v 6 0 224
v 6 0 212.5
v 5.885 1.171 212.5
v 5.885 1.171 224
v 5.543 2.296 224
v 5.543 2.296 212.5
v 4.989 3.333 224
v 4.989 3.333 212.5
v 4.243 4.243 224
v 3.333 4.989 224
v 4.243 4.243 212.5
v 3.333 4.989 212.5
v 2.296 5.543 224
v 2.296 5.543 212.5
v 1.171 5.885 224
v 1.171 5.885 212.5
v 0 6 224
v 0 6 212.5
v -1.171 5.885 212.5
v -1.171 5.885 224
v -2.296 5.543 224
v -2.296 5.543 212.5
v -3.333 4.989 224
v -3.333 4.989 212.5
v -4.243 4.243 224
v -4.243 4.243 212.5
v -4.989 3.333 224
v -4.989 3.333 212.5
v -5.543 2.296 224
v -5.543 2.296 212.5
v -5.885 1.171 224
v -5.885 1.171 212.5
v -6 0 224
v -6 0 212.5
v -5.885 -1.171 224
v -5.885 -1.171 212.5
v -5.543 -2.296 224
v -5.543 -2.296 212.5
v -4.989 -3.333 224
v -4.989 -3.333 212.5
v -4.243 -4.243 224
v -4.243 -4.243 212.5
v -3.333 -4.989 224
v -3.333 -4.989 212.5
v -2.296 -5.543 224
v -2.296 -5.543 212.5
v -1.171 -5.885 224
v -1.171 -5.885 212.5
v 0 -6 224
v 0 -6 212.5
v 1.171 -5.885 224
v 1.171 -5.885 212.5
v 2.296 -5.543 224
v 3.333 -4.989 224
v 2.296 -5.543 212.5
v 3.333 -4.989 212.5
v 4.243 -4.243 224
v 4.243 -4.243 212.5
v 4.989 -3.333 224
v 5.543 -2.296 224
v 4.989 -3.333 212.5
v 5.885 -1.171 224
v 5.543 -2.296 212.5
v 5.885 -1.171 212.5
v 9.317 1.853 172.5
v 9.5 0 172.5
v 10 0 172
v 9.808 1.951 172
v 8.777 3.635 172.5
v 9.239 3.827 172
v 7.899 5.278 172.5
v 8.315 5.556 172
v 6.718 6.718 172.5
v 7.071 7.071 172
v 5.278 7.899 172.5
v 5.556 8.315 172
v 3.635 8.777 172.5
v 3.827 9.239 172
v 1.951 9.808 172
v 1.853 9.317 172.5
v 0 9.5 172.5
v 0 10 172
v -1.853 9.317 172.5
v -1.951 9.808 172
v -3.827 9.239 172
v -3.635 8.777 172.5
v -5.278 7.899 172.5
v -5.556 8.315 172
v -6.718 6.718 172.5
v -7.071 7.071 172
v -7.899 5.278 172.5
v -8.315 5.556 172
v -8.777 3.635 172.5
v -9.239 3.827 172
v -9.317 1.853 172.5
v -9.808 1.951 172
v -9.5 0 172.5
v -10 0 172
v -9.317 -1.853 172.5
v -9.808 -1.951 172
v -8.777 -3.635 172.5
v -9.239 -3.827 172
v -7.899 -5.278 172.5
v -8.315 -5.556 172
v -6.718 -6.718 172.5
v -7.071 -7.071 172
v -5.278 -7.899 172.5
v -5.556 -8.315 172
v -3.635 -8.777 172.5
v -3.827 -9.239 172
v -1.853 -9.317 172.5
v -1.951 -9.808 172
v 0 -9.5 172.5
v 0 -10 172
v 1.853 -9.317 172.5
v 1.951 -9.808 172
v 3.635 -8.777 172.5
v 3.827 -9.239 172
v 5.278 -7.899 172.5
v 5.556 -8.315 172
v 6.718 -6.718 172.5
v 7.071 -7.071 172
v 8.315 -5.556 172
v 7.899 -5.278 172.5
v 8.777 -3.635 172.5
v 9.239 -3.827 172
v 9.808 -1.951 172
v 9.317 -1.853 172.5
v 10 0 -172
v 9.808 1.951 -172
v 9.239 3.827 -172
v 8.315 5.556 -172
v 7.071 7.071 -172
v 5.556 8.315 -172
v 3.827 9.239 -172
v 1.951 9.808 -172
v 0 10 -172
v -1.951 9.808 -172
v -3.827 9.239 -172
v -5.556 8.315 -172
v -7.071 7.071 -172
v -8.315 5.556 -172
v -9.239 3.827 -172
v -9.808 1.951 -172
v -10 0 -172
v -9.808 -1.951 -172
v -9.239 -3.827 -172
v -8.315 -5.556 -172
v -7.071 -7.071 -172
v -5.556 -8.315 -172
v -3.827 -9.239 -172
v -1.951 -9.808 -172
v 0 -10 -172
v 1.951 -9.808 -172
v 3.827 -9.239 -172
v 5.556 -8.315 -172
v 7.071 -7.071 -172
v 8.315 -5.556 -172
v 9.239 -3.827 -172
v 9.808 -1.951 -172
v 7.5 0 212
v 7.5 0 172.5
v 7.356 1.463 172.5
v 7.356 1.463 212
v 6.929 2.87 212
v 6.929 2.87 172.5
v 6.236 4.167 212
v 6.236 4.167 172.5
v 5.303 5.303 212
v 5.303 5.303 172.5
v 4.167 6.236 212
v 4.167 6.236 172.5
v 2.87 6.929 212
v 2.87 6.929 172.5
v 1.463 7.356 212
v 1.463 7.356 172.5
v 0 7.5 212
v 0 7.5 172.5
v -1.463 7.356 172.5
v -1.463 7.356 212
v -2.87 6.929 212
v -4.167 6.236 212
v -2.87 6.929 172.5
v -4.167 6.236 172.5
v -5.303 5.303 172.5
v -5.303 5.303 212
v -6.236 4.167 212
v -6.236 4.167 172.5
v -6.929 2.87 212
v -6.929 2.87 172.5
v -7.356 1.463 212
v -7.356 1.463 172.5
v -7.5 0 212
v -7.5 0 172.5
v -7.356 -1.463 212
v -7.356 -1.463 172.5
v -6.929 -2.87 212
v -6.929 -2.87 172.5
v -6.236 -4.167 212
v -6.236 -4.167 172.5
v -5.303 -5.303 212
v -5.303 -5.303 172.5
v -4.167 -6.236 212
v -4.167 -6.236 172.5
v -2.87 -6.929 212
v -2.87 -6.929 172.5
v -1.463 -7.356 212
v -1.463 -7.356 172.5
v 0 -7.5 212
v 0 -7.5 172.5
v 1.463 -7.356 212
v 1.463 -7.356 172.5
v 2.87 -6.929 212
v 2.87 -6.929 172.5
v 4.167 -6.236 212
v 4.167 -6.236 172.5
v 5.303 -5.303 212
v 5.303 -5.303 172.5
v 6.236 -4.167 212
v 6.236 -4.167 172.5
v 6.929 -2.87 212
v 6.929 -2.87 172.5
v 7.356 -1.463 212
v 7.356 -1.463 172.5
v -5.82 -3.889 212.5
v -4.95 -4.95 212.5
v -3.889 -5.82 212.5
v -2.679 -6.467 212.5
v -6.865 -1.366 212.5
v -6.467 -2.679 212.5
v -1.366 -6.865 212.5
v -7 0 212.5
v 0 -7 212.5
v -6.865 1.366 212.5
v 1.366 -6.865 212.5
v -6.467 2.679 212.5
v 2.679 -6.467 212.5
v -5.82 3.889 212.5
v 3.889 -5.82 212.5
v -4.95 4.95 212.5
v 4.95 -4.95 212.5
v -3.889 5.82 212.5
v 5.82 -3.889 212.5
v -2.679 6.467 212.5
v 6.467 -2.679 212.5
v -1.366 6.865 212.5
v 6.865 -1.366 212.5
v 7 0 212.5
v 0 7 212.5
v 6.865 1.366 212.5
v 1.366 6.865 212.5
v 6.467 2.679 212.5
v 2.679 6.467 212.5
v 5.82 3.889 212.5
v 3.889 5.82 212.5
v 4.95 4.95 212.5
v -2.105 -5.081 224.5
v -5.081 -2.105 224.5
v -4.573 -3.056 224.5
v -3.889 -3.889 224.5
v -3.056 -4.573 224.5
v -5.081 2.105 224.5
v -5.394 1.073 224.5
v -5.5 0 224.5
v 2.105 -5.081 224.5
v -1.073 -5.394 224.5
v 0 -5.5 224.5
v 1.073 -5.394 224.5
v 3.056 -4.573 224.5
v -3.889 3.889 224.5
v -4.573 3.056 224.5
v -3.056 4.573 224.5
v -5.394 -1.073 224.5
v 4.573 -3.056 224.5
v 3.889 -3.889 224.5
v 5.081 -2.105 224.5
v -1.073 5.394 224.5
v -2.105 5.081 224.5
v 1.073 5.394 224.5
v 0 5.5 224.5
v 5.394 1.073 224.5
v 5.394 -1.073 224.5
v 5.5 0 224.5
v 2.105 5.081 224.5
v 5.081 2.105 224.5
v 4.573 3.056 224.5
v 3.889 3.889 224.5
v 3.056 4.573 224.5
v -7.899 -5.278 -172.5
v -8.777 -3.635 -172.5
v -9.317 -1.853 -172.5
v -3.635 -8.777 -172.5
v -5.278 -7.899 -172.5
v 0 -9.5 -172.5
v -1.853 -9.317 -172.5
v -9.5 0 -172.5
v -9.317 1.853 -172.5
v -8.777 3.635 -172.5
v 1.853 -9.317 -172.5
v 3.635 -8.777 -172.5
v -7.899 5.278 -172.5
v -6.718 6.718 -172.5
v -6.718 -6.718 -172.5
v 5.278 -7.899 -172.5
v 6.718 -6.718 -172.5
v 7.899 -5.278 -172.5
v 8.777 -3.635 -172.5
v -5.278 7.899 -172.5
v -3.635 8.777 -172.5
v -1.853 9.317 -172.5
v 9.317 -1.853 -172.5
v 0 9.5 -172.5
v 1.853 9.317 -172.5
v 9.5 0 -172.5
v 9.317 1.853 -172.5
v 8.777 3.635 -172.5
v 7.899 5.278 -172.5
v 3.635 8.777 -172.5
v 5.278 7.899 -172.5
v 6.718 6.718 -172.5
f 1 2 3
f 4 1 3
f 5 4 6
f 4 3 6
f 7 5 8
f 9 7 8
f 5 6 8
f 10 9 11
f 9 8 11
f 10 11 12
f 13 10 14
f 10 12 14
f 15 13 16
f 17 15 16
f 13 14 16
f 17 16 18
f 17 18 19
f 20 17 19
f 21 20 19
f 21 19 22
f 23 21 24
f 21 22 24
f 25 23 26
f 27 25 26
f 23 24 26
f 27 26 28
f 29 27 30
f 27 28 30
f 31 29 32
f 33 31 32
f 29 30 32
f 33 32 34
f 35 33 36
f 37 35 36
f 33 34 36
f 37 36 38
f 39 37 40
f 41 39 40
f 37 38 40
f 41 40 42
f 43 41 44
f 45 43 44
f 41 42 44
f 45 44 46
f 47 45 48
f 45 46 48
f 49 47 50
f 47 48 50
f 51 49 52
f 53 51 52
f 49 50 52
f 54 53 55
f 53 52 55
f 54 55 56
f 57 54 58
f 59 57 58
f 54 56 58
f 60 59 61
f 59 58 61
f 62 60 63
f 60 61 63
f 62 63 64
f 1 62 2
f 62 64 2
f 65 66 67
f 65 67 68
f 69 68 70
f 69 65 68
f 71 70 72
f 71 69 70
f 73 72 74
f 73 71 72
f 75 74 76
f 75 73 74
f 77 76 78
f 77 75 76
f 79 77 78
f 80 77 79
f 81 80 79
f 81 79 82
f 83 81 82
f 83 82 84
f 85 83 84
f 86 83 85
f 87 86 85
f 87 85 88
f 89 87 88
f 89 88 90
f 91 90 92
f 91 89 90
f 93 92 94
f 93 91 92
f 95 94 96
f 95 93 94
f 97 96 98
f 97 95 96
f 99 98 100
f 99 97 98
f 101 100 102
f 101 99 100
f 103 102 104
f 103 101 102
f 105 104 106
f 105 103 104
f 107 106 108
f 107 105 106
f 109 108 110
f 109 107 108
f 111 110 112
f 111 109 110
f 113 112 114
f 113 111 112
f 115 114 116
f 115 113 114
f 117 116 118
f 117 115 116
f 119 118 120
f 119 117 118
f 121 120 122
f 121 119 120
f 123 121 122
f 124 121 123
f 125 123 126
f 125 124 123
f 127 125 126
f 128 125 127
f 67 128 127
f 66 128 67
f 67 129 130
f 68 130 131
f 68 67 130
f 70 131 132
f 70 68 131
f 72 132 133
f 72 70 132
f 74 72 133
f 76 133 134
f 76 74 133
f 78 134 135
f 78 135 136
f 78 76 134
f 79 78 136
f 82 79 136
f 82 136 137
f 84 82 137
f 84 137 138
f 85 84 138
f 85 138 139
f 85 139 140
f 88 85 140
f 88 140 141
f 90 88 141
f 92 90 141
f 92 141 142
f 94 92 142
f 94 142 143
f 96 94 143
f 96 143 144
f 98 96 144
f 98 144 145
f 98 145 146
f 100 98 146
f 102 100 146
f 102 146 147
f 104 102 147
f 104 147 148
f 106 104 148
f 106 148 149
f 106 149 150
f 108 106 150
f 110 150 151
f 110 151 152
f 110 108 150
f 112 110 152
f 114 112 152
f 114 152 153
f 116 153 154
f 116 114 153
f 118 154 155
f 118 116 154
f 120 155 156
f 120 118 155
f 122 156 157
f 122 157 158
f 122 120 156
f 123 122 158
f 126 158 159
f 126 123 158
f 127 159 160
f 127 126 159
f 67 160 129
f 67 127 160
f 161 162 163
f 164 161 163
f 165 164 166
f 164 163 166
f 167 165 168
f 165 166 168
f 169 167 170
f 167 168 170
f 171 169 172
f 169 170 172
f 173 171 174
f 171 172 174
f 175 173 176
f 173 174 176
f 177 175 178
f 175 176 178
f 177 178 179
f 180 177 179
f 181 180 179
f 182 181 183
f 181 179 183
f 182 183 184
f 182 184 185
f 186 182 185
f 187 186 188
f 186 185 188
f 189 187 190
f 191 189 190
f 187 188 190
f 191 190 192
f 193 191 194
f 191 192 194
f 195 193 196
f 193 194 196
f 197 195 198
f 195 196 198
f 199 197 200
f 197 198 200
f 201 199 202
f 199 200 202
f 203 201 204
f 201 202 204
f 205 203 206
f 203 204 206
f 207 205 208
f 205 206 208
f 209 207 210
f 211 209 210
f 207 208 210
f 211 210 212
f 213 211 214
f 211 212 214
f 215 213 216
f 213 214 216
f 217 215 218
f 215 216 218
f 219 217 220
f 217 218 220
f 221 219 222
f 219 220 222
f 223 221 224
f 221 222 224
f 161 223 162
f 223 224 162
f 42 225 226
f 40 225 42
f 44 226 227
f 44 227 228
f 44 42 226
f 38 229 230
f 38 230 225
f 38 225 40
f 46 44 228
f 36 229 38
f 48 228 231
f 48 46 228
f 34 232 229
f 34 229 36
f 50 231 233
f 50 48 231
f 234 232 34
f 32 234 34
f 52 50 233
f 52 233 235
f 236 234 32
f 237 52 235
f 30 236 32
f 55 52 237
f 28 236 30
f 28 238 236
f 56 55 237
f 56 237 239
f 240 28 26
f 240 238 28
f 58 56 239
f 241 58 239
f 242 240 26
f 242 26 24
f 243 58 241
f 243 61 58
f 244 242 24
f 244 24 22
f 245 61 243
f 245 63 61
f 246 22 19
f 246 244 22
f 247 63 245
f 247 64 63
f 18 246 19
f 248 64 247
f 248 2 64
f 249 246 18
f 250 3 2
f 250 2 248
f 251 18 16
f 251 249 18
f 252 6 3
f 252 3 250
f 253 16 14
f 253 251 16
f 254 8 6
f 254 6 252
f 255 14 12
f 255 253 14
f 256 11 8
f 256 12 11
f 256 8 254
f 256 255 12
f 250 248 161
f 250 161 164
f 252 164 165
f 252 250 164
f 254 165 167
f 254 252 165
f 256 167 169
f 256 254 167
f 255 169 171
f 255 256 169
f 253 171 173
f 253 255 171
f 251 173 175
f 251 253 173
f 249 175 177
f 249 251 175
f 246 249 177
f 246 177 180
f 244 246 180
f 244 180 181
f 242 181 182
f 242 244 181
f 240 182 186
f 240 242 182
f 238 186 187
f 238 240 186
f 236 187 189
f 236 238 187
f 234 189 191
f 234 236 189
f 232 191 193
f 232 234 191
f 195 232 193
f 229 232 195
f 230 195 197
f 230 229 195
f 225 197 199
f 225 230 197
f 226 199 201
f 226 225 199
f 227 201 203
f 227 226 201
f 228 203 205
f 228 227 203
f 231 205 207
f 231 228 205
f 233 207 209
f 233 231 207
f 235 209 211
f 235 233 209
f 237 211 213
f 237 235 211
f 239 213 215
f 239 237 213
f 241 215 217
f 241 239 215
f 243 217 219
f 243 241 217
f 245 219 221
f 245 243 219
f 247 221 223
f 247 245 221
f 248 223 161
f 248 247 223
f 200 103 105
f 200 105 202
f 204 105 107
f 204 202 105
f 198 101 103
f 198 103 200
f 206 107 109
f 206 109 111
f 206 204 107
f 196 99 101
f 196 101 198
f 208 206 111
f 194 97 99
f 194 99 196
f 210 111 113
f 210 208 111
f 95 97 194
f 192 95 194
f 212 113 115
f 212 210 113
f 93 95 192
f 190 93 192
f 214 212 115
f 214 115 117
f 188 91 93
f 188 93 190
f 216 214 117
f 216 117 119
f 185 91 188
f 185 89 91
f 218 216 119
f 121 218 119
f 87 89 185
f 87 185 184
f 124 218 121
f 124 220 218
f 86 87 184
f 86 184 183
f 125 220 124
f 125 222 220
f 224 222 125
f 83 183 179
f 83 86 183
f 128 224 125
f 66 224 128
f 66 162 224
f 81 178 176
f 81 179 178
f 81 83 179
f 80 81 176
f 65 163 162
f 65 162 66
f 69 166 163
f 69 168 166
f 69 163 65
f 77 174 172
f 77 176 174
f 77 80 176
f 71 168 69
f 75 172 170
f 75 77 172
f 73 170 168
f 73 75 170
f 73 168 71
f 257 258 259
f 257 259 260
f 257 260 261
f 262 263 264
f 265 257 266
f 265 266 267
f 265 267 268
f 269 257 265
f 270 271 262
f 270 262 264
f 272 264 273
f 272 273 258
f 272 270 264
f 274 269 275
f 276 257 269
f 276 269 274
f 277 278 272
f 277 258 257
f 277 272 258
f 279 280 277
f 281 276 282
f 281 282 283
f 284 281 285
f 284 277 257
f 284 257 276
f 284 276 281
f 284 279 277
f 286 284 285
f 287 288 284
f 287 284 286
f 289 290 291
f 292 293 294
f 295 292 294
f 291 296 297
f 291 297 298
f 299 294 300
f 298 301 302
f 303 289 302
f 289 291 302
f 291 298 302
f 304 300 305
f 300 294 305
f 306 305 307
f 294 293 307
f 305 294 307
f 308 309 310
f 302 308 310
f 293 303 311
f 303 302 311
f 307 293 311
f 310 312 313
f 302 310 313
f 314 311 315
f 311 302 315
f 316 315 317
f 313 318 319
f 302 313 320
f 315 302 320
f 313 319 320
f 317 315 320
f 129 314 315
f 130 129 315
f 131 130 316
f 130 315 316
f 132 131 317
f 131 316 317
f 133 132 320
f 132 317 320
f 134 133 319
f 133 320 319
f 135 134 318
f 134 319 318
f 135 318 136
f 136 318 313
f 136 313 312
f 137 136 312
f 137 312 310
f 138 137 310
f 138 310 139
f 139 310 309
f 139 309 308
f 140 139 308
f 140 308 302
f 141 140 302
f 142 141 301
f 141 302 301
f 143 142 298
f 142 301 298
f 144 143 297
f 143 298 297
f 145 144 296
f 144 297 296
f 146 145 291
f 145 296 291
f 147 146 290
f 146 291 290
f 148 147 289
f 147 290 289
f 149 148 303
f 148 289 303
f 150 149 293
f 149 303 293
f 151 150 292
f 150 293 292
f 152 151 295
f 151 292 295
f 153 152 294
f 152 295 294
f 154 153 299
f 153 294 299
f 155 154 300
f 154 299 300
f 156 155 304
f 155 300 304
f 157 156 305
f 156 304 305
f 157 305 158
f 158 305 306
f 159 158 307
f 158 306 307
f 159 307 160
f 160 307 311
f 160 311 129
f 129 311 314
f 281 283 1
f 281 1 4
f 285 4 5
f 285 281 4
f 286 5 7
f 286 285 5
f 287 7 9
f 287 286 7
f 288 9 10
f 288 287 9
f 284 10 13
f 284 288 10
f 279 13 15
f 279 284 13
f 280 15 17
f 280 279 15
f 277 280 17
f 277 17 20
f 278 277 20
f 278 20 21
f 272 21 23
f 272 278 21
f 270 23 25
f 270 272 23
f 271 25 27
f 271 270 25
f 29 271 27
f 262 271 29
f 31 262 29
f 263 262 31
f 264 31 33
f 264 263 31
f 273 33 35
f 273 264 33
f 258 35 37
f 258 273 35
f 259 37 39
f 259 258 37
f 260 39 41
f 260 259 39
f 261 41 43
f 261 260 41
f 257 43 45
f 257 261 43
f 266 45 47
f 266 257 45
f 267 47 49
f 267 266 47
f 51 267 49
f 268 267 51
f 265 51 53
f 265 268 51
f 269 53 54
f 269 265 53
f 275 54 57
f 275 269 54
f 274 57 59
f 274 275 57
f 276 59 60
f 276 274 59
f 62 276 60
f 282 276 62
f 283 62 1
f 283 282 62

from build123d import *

# Parameters (mm, degrees)
SKETCH1_R           = 10
BOSS_EXTRUDE1_DEPTH = 172.5
SKETCH4_R           = 7.5
BOSS_EXTRUDE2_DEPTH = 40
SKETCH5_R           = 6
BOSS_EXTRUDE3_DEPTH = 12
CHAMFER1_SIZE       = 0.5


with BuildPart() as part:
    # Sketch1 → Boss-Extrude1 (new, symmetric)
    with BuildSketch(Plane.XY):
        Circle(SKETCH1_R)
    extrude(amount=BOSS_EXTRUDE1_DEPTH, both=True)

    # Sketch4 → Boss-Extrude2 (add)
    with BuildSketch(Plane.XY.offset(172.5)):
        Circle(SKETCH4_R)
    extrude(amount=BOSS_EXTRUDE2_DEPTH)

    # Sketch5 → Boss-Extrude3 (add)
    with BuildSketch(Plane.XY.offset(212.5)):
        Circle(SKETCH5_R)
    extrude(amount=BOSS_EXTRUDE3_DEPTH)

    # Chamfer1
    chamfer1_edges = [part.edges().sort_by_distance(p)[0] for p in [
        (-6, 0, 224.5),
        (-10, 0, -172.5),
        (-10, 0, 172.5),
        (-7.5, 0, 212.5),
    ]]
    chamfer(chamfer1_edges, length=CHAMFER1_SIZE)


solid = part.part
